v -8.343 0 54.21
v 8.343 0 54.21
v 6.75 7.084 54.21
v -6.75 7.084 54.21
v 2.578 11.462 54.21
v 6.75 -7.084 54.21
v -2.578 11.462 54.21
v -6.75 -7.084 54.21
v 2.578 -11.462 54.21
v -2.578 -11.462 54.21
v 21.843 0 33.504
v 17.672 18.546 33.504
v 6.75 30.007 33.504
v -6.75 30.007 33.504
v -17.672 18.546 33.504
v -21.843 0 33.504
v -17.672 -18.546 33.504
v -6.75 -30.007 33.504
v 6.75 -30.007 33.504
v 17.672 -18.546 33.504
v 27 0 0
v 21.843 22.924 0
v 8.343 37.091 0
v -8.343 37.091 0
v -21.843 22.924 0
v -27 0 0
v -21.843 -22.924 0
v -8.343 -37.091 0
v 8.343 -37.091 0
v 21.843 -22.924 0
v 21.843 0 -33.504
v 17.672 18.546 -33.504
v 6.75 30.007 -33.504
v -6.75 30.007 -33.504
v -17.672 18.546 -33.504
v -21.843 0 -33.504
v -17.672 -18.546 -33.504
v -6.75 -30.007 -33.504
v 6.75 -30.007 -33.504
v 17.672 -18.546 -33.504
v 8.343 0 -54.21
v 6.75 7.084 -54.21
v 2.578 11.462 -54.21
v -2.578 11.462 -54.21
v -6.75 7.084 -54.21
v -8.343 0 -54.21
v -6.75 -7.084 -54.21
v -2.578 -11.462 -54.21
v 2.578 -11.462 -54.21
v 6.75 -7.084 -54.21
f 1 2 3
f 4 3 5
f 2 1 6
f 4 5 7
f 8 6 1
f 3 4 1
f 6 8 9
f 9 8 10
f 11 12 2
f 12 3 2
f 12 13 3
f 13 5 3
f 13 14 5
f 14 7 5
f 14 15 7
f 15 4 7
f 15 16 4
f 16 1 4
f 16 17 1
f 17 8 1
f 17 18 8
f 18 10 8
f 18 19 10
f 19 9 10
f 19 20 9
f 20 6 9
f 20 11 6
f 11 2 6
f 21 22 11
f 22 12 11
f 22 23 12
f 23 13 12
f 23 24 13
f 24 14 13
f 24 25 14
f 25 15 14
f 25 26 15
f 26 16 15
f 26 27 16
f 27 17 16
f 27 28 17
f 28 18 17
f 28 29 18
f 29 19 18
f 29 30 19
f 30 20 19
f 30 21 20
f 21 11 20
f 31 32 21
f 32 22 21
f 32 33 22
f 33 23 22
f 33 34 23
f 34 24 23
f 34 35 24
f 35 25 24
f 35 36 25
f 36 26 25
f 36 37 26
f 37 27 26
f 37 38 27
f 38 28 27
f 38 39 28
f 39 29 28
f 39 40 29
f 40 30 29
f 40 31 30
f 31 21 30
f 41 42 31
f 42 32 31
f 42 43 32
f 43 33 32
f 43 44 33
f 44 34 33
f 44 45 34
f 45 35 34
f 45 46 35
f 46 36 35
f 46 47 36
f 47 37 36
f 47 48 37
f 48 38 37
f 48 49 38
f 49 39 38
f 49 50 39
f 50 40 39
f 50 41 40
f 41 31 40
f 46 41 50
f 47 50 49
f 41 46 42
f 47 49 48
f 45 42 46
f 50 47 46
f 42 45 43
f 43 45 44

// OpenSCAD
// Generated by SolidPython 1.0.1 on 2020-07-29 00:46:49


scale(v = [9, 13, 19]) {
	sphere(r = 3);
}
/***********************************************
*********      SolidPython code:      **********
************************************************
 
# import packages: SolidPython
from solid import *
from solid.utils import *
from itertools import chain, combinations, permutations


class Resize:

    def __init__(self, scad_file):
        self.scad_file = scad_file
        #self.scad_file = import_scad(scad_file)
        # cone/cylinder param:
        self.r1 = 0
        self.r2 = 0
        self.h = 0
        # rectangular prism param:
        self.w = 0
        self.l = 0
        # ellipse param:
        self.r = 0

    # import OpenScad code (file name corresponds to shape)


    # classify shape + parameters
    def assign(self, param1, param2, param3):
        if self.scad_file == 'cone.scad':
            self.r1 = param1
            self.r2 = param2
            self.h = param3
        elif self.scad_file == 'cylinder.scad':
            self.r1 = param1
            self.r2 = param2
            self.h = param3
        elif self.scad_file == 'rectangularPrism.scad':
            self.h = param1
            self.l = param2
            self.w = param3
        else:
            self.r = param1
            self.h = param2

    # resize parameters
    def iterate(self):
        x = range(3, 20, 2)
        i = 1
        if self.scad_file == 'cone.scad':
            tempList = list(permutations(x, 2))
            for temp in tempList:
                param1 = temp[0]
                param2 = temp[1]
                filepath = 'produced_scad_files/' + 'cone' + str(param1) + '_' + str(param2) + '_' + '.scad'
                scad_render_to_file(cylinder(h=param1, r1=param2, r2=0), filepath)

        elif self.scad_file == 'cylinder.scad':
            tempList = list(permutations(x, 3))
            for temp in tempList:
                param1 = temp[0]
                param2 = temp[1]
                filepath = 'produced_scad_files/' + 'cylinder' + str(param1) + '_' + str(param2) + '_' + '.scad'
                scad_render_to_file(cylinder(h=param1, r1=param2, r2=param2), filepath)

        elif self.scad_file == 'rectangularPrism.scad':
            tempList = list(permutations(x, 3))
            for temp in tempList:
                param1 = temp[0]
                param2 = temp[1]
                param3 = temp[2]
                filepath = 'produced_scad_files/' + 'rectangularPrism' + str(param1) + '_' + str(param2) + '_' + str(
                    param3) + '.scad'
                scad_render_to_file(cube(size=(param1, param2, param3)), filepath)

        elif self.scad_file == 'ellipse.scad':
            tempList = list(permutations(x, 4))
            for temp in tempList:
                param1 = temp[0]
                param2 = temp[1]
                param3 = temp[2]
                param4 = temp[3]
                filepath = 'produced_scad_files/' + 'ellipse' + str(param1) + '_' + str(param2) + '_' + str(param3) + '_' + str(param4) + '.scad'
                scad_render_to_file(scale([param1, param2, param3])(sphere(r=param4)), filepath)

    def render_to_scadfile(self):
        scad_render_to_file(scad, 'example.scad') 
 
************************************************/
